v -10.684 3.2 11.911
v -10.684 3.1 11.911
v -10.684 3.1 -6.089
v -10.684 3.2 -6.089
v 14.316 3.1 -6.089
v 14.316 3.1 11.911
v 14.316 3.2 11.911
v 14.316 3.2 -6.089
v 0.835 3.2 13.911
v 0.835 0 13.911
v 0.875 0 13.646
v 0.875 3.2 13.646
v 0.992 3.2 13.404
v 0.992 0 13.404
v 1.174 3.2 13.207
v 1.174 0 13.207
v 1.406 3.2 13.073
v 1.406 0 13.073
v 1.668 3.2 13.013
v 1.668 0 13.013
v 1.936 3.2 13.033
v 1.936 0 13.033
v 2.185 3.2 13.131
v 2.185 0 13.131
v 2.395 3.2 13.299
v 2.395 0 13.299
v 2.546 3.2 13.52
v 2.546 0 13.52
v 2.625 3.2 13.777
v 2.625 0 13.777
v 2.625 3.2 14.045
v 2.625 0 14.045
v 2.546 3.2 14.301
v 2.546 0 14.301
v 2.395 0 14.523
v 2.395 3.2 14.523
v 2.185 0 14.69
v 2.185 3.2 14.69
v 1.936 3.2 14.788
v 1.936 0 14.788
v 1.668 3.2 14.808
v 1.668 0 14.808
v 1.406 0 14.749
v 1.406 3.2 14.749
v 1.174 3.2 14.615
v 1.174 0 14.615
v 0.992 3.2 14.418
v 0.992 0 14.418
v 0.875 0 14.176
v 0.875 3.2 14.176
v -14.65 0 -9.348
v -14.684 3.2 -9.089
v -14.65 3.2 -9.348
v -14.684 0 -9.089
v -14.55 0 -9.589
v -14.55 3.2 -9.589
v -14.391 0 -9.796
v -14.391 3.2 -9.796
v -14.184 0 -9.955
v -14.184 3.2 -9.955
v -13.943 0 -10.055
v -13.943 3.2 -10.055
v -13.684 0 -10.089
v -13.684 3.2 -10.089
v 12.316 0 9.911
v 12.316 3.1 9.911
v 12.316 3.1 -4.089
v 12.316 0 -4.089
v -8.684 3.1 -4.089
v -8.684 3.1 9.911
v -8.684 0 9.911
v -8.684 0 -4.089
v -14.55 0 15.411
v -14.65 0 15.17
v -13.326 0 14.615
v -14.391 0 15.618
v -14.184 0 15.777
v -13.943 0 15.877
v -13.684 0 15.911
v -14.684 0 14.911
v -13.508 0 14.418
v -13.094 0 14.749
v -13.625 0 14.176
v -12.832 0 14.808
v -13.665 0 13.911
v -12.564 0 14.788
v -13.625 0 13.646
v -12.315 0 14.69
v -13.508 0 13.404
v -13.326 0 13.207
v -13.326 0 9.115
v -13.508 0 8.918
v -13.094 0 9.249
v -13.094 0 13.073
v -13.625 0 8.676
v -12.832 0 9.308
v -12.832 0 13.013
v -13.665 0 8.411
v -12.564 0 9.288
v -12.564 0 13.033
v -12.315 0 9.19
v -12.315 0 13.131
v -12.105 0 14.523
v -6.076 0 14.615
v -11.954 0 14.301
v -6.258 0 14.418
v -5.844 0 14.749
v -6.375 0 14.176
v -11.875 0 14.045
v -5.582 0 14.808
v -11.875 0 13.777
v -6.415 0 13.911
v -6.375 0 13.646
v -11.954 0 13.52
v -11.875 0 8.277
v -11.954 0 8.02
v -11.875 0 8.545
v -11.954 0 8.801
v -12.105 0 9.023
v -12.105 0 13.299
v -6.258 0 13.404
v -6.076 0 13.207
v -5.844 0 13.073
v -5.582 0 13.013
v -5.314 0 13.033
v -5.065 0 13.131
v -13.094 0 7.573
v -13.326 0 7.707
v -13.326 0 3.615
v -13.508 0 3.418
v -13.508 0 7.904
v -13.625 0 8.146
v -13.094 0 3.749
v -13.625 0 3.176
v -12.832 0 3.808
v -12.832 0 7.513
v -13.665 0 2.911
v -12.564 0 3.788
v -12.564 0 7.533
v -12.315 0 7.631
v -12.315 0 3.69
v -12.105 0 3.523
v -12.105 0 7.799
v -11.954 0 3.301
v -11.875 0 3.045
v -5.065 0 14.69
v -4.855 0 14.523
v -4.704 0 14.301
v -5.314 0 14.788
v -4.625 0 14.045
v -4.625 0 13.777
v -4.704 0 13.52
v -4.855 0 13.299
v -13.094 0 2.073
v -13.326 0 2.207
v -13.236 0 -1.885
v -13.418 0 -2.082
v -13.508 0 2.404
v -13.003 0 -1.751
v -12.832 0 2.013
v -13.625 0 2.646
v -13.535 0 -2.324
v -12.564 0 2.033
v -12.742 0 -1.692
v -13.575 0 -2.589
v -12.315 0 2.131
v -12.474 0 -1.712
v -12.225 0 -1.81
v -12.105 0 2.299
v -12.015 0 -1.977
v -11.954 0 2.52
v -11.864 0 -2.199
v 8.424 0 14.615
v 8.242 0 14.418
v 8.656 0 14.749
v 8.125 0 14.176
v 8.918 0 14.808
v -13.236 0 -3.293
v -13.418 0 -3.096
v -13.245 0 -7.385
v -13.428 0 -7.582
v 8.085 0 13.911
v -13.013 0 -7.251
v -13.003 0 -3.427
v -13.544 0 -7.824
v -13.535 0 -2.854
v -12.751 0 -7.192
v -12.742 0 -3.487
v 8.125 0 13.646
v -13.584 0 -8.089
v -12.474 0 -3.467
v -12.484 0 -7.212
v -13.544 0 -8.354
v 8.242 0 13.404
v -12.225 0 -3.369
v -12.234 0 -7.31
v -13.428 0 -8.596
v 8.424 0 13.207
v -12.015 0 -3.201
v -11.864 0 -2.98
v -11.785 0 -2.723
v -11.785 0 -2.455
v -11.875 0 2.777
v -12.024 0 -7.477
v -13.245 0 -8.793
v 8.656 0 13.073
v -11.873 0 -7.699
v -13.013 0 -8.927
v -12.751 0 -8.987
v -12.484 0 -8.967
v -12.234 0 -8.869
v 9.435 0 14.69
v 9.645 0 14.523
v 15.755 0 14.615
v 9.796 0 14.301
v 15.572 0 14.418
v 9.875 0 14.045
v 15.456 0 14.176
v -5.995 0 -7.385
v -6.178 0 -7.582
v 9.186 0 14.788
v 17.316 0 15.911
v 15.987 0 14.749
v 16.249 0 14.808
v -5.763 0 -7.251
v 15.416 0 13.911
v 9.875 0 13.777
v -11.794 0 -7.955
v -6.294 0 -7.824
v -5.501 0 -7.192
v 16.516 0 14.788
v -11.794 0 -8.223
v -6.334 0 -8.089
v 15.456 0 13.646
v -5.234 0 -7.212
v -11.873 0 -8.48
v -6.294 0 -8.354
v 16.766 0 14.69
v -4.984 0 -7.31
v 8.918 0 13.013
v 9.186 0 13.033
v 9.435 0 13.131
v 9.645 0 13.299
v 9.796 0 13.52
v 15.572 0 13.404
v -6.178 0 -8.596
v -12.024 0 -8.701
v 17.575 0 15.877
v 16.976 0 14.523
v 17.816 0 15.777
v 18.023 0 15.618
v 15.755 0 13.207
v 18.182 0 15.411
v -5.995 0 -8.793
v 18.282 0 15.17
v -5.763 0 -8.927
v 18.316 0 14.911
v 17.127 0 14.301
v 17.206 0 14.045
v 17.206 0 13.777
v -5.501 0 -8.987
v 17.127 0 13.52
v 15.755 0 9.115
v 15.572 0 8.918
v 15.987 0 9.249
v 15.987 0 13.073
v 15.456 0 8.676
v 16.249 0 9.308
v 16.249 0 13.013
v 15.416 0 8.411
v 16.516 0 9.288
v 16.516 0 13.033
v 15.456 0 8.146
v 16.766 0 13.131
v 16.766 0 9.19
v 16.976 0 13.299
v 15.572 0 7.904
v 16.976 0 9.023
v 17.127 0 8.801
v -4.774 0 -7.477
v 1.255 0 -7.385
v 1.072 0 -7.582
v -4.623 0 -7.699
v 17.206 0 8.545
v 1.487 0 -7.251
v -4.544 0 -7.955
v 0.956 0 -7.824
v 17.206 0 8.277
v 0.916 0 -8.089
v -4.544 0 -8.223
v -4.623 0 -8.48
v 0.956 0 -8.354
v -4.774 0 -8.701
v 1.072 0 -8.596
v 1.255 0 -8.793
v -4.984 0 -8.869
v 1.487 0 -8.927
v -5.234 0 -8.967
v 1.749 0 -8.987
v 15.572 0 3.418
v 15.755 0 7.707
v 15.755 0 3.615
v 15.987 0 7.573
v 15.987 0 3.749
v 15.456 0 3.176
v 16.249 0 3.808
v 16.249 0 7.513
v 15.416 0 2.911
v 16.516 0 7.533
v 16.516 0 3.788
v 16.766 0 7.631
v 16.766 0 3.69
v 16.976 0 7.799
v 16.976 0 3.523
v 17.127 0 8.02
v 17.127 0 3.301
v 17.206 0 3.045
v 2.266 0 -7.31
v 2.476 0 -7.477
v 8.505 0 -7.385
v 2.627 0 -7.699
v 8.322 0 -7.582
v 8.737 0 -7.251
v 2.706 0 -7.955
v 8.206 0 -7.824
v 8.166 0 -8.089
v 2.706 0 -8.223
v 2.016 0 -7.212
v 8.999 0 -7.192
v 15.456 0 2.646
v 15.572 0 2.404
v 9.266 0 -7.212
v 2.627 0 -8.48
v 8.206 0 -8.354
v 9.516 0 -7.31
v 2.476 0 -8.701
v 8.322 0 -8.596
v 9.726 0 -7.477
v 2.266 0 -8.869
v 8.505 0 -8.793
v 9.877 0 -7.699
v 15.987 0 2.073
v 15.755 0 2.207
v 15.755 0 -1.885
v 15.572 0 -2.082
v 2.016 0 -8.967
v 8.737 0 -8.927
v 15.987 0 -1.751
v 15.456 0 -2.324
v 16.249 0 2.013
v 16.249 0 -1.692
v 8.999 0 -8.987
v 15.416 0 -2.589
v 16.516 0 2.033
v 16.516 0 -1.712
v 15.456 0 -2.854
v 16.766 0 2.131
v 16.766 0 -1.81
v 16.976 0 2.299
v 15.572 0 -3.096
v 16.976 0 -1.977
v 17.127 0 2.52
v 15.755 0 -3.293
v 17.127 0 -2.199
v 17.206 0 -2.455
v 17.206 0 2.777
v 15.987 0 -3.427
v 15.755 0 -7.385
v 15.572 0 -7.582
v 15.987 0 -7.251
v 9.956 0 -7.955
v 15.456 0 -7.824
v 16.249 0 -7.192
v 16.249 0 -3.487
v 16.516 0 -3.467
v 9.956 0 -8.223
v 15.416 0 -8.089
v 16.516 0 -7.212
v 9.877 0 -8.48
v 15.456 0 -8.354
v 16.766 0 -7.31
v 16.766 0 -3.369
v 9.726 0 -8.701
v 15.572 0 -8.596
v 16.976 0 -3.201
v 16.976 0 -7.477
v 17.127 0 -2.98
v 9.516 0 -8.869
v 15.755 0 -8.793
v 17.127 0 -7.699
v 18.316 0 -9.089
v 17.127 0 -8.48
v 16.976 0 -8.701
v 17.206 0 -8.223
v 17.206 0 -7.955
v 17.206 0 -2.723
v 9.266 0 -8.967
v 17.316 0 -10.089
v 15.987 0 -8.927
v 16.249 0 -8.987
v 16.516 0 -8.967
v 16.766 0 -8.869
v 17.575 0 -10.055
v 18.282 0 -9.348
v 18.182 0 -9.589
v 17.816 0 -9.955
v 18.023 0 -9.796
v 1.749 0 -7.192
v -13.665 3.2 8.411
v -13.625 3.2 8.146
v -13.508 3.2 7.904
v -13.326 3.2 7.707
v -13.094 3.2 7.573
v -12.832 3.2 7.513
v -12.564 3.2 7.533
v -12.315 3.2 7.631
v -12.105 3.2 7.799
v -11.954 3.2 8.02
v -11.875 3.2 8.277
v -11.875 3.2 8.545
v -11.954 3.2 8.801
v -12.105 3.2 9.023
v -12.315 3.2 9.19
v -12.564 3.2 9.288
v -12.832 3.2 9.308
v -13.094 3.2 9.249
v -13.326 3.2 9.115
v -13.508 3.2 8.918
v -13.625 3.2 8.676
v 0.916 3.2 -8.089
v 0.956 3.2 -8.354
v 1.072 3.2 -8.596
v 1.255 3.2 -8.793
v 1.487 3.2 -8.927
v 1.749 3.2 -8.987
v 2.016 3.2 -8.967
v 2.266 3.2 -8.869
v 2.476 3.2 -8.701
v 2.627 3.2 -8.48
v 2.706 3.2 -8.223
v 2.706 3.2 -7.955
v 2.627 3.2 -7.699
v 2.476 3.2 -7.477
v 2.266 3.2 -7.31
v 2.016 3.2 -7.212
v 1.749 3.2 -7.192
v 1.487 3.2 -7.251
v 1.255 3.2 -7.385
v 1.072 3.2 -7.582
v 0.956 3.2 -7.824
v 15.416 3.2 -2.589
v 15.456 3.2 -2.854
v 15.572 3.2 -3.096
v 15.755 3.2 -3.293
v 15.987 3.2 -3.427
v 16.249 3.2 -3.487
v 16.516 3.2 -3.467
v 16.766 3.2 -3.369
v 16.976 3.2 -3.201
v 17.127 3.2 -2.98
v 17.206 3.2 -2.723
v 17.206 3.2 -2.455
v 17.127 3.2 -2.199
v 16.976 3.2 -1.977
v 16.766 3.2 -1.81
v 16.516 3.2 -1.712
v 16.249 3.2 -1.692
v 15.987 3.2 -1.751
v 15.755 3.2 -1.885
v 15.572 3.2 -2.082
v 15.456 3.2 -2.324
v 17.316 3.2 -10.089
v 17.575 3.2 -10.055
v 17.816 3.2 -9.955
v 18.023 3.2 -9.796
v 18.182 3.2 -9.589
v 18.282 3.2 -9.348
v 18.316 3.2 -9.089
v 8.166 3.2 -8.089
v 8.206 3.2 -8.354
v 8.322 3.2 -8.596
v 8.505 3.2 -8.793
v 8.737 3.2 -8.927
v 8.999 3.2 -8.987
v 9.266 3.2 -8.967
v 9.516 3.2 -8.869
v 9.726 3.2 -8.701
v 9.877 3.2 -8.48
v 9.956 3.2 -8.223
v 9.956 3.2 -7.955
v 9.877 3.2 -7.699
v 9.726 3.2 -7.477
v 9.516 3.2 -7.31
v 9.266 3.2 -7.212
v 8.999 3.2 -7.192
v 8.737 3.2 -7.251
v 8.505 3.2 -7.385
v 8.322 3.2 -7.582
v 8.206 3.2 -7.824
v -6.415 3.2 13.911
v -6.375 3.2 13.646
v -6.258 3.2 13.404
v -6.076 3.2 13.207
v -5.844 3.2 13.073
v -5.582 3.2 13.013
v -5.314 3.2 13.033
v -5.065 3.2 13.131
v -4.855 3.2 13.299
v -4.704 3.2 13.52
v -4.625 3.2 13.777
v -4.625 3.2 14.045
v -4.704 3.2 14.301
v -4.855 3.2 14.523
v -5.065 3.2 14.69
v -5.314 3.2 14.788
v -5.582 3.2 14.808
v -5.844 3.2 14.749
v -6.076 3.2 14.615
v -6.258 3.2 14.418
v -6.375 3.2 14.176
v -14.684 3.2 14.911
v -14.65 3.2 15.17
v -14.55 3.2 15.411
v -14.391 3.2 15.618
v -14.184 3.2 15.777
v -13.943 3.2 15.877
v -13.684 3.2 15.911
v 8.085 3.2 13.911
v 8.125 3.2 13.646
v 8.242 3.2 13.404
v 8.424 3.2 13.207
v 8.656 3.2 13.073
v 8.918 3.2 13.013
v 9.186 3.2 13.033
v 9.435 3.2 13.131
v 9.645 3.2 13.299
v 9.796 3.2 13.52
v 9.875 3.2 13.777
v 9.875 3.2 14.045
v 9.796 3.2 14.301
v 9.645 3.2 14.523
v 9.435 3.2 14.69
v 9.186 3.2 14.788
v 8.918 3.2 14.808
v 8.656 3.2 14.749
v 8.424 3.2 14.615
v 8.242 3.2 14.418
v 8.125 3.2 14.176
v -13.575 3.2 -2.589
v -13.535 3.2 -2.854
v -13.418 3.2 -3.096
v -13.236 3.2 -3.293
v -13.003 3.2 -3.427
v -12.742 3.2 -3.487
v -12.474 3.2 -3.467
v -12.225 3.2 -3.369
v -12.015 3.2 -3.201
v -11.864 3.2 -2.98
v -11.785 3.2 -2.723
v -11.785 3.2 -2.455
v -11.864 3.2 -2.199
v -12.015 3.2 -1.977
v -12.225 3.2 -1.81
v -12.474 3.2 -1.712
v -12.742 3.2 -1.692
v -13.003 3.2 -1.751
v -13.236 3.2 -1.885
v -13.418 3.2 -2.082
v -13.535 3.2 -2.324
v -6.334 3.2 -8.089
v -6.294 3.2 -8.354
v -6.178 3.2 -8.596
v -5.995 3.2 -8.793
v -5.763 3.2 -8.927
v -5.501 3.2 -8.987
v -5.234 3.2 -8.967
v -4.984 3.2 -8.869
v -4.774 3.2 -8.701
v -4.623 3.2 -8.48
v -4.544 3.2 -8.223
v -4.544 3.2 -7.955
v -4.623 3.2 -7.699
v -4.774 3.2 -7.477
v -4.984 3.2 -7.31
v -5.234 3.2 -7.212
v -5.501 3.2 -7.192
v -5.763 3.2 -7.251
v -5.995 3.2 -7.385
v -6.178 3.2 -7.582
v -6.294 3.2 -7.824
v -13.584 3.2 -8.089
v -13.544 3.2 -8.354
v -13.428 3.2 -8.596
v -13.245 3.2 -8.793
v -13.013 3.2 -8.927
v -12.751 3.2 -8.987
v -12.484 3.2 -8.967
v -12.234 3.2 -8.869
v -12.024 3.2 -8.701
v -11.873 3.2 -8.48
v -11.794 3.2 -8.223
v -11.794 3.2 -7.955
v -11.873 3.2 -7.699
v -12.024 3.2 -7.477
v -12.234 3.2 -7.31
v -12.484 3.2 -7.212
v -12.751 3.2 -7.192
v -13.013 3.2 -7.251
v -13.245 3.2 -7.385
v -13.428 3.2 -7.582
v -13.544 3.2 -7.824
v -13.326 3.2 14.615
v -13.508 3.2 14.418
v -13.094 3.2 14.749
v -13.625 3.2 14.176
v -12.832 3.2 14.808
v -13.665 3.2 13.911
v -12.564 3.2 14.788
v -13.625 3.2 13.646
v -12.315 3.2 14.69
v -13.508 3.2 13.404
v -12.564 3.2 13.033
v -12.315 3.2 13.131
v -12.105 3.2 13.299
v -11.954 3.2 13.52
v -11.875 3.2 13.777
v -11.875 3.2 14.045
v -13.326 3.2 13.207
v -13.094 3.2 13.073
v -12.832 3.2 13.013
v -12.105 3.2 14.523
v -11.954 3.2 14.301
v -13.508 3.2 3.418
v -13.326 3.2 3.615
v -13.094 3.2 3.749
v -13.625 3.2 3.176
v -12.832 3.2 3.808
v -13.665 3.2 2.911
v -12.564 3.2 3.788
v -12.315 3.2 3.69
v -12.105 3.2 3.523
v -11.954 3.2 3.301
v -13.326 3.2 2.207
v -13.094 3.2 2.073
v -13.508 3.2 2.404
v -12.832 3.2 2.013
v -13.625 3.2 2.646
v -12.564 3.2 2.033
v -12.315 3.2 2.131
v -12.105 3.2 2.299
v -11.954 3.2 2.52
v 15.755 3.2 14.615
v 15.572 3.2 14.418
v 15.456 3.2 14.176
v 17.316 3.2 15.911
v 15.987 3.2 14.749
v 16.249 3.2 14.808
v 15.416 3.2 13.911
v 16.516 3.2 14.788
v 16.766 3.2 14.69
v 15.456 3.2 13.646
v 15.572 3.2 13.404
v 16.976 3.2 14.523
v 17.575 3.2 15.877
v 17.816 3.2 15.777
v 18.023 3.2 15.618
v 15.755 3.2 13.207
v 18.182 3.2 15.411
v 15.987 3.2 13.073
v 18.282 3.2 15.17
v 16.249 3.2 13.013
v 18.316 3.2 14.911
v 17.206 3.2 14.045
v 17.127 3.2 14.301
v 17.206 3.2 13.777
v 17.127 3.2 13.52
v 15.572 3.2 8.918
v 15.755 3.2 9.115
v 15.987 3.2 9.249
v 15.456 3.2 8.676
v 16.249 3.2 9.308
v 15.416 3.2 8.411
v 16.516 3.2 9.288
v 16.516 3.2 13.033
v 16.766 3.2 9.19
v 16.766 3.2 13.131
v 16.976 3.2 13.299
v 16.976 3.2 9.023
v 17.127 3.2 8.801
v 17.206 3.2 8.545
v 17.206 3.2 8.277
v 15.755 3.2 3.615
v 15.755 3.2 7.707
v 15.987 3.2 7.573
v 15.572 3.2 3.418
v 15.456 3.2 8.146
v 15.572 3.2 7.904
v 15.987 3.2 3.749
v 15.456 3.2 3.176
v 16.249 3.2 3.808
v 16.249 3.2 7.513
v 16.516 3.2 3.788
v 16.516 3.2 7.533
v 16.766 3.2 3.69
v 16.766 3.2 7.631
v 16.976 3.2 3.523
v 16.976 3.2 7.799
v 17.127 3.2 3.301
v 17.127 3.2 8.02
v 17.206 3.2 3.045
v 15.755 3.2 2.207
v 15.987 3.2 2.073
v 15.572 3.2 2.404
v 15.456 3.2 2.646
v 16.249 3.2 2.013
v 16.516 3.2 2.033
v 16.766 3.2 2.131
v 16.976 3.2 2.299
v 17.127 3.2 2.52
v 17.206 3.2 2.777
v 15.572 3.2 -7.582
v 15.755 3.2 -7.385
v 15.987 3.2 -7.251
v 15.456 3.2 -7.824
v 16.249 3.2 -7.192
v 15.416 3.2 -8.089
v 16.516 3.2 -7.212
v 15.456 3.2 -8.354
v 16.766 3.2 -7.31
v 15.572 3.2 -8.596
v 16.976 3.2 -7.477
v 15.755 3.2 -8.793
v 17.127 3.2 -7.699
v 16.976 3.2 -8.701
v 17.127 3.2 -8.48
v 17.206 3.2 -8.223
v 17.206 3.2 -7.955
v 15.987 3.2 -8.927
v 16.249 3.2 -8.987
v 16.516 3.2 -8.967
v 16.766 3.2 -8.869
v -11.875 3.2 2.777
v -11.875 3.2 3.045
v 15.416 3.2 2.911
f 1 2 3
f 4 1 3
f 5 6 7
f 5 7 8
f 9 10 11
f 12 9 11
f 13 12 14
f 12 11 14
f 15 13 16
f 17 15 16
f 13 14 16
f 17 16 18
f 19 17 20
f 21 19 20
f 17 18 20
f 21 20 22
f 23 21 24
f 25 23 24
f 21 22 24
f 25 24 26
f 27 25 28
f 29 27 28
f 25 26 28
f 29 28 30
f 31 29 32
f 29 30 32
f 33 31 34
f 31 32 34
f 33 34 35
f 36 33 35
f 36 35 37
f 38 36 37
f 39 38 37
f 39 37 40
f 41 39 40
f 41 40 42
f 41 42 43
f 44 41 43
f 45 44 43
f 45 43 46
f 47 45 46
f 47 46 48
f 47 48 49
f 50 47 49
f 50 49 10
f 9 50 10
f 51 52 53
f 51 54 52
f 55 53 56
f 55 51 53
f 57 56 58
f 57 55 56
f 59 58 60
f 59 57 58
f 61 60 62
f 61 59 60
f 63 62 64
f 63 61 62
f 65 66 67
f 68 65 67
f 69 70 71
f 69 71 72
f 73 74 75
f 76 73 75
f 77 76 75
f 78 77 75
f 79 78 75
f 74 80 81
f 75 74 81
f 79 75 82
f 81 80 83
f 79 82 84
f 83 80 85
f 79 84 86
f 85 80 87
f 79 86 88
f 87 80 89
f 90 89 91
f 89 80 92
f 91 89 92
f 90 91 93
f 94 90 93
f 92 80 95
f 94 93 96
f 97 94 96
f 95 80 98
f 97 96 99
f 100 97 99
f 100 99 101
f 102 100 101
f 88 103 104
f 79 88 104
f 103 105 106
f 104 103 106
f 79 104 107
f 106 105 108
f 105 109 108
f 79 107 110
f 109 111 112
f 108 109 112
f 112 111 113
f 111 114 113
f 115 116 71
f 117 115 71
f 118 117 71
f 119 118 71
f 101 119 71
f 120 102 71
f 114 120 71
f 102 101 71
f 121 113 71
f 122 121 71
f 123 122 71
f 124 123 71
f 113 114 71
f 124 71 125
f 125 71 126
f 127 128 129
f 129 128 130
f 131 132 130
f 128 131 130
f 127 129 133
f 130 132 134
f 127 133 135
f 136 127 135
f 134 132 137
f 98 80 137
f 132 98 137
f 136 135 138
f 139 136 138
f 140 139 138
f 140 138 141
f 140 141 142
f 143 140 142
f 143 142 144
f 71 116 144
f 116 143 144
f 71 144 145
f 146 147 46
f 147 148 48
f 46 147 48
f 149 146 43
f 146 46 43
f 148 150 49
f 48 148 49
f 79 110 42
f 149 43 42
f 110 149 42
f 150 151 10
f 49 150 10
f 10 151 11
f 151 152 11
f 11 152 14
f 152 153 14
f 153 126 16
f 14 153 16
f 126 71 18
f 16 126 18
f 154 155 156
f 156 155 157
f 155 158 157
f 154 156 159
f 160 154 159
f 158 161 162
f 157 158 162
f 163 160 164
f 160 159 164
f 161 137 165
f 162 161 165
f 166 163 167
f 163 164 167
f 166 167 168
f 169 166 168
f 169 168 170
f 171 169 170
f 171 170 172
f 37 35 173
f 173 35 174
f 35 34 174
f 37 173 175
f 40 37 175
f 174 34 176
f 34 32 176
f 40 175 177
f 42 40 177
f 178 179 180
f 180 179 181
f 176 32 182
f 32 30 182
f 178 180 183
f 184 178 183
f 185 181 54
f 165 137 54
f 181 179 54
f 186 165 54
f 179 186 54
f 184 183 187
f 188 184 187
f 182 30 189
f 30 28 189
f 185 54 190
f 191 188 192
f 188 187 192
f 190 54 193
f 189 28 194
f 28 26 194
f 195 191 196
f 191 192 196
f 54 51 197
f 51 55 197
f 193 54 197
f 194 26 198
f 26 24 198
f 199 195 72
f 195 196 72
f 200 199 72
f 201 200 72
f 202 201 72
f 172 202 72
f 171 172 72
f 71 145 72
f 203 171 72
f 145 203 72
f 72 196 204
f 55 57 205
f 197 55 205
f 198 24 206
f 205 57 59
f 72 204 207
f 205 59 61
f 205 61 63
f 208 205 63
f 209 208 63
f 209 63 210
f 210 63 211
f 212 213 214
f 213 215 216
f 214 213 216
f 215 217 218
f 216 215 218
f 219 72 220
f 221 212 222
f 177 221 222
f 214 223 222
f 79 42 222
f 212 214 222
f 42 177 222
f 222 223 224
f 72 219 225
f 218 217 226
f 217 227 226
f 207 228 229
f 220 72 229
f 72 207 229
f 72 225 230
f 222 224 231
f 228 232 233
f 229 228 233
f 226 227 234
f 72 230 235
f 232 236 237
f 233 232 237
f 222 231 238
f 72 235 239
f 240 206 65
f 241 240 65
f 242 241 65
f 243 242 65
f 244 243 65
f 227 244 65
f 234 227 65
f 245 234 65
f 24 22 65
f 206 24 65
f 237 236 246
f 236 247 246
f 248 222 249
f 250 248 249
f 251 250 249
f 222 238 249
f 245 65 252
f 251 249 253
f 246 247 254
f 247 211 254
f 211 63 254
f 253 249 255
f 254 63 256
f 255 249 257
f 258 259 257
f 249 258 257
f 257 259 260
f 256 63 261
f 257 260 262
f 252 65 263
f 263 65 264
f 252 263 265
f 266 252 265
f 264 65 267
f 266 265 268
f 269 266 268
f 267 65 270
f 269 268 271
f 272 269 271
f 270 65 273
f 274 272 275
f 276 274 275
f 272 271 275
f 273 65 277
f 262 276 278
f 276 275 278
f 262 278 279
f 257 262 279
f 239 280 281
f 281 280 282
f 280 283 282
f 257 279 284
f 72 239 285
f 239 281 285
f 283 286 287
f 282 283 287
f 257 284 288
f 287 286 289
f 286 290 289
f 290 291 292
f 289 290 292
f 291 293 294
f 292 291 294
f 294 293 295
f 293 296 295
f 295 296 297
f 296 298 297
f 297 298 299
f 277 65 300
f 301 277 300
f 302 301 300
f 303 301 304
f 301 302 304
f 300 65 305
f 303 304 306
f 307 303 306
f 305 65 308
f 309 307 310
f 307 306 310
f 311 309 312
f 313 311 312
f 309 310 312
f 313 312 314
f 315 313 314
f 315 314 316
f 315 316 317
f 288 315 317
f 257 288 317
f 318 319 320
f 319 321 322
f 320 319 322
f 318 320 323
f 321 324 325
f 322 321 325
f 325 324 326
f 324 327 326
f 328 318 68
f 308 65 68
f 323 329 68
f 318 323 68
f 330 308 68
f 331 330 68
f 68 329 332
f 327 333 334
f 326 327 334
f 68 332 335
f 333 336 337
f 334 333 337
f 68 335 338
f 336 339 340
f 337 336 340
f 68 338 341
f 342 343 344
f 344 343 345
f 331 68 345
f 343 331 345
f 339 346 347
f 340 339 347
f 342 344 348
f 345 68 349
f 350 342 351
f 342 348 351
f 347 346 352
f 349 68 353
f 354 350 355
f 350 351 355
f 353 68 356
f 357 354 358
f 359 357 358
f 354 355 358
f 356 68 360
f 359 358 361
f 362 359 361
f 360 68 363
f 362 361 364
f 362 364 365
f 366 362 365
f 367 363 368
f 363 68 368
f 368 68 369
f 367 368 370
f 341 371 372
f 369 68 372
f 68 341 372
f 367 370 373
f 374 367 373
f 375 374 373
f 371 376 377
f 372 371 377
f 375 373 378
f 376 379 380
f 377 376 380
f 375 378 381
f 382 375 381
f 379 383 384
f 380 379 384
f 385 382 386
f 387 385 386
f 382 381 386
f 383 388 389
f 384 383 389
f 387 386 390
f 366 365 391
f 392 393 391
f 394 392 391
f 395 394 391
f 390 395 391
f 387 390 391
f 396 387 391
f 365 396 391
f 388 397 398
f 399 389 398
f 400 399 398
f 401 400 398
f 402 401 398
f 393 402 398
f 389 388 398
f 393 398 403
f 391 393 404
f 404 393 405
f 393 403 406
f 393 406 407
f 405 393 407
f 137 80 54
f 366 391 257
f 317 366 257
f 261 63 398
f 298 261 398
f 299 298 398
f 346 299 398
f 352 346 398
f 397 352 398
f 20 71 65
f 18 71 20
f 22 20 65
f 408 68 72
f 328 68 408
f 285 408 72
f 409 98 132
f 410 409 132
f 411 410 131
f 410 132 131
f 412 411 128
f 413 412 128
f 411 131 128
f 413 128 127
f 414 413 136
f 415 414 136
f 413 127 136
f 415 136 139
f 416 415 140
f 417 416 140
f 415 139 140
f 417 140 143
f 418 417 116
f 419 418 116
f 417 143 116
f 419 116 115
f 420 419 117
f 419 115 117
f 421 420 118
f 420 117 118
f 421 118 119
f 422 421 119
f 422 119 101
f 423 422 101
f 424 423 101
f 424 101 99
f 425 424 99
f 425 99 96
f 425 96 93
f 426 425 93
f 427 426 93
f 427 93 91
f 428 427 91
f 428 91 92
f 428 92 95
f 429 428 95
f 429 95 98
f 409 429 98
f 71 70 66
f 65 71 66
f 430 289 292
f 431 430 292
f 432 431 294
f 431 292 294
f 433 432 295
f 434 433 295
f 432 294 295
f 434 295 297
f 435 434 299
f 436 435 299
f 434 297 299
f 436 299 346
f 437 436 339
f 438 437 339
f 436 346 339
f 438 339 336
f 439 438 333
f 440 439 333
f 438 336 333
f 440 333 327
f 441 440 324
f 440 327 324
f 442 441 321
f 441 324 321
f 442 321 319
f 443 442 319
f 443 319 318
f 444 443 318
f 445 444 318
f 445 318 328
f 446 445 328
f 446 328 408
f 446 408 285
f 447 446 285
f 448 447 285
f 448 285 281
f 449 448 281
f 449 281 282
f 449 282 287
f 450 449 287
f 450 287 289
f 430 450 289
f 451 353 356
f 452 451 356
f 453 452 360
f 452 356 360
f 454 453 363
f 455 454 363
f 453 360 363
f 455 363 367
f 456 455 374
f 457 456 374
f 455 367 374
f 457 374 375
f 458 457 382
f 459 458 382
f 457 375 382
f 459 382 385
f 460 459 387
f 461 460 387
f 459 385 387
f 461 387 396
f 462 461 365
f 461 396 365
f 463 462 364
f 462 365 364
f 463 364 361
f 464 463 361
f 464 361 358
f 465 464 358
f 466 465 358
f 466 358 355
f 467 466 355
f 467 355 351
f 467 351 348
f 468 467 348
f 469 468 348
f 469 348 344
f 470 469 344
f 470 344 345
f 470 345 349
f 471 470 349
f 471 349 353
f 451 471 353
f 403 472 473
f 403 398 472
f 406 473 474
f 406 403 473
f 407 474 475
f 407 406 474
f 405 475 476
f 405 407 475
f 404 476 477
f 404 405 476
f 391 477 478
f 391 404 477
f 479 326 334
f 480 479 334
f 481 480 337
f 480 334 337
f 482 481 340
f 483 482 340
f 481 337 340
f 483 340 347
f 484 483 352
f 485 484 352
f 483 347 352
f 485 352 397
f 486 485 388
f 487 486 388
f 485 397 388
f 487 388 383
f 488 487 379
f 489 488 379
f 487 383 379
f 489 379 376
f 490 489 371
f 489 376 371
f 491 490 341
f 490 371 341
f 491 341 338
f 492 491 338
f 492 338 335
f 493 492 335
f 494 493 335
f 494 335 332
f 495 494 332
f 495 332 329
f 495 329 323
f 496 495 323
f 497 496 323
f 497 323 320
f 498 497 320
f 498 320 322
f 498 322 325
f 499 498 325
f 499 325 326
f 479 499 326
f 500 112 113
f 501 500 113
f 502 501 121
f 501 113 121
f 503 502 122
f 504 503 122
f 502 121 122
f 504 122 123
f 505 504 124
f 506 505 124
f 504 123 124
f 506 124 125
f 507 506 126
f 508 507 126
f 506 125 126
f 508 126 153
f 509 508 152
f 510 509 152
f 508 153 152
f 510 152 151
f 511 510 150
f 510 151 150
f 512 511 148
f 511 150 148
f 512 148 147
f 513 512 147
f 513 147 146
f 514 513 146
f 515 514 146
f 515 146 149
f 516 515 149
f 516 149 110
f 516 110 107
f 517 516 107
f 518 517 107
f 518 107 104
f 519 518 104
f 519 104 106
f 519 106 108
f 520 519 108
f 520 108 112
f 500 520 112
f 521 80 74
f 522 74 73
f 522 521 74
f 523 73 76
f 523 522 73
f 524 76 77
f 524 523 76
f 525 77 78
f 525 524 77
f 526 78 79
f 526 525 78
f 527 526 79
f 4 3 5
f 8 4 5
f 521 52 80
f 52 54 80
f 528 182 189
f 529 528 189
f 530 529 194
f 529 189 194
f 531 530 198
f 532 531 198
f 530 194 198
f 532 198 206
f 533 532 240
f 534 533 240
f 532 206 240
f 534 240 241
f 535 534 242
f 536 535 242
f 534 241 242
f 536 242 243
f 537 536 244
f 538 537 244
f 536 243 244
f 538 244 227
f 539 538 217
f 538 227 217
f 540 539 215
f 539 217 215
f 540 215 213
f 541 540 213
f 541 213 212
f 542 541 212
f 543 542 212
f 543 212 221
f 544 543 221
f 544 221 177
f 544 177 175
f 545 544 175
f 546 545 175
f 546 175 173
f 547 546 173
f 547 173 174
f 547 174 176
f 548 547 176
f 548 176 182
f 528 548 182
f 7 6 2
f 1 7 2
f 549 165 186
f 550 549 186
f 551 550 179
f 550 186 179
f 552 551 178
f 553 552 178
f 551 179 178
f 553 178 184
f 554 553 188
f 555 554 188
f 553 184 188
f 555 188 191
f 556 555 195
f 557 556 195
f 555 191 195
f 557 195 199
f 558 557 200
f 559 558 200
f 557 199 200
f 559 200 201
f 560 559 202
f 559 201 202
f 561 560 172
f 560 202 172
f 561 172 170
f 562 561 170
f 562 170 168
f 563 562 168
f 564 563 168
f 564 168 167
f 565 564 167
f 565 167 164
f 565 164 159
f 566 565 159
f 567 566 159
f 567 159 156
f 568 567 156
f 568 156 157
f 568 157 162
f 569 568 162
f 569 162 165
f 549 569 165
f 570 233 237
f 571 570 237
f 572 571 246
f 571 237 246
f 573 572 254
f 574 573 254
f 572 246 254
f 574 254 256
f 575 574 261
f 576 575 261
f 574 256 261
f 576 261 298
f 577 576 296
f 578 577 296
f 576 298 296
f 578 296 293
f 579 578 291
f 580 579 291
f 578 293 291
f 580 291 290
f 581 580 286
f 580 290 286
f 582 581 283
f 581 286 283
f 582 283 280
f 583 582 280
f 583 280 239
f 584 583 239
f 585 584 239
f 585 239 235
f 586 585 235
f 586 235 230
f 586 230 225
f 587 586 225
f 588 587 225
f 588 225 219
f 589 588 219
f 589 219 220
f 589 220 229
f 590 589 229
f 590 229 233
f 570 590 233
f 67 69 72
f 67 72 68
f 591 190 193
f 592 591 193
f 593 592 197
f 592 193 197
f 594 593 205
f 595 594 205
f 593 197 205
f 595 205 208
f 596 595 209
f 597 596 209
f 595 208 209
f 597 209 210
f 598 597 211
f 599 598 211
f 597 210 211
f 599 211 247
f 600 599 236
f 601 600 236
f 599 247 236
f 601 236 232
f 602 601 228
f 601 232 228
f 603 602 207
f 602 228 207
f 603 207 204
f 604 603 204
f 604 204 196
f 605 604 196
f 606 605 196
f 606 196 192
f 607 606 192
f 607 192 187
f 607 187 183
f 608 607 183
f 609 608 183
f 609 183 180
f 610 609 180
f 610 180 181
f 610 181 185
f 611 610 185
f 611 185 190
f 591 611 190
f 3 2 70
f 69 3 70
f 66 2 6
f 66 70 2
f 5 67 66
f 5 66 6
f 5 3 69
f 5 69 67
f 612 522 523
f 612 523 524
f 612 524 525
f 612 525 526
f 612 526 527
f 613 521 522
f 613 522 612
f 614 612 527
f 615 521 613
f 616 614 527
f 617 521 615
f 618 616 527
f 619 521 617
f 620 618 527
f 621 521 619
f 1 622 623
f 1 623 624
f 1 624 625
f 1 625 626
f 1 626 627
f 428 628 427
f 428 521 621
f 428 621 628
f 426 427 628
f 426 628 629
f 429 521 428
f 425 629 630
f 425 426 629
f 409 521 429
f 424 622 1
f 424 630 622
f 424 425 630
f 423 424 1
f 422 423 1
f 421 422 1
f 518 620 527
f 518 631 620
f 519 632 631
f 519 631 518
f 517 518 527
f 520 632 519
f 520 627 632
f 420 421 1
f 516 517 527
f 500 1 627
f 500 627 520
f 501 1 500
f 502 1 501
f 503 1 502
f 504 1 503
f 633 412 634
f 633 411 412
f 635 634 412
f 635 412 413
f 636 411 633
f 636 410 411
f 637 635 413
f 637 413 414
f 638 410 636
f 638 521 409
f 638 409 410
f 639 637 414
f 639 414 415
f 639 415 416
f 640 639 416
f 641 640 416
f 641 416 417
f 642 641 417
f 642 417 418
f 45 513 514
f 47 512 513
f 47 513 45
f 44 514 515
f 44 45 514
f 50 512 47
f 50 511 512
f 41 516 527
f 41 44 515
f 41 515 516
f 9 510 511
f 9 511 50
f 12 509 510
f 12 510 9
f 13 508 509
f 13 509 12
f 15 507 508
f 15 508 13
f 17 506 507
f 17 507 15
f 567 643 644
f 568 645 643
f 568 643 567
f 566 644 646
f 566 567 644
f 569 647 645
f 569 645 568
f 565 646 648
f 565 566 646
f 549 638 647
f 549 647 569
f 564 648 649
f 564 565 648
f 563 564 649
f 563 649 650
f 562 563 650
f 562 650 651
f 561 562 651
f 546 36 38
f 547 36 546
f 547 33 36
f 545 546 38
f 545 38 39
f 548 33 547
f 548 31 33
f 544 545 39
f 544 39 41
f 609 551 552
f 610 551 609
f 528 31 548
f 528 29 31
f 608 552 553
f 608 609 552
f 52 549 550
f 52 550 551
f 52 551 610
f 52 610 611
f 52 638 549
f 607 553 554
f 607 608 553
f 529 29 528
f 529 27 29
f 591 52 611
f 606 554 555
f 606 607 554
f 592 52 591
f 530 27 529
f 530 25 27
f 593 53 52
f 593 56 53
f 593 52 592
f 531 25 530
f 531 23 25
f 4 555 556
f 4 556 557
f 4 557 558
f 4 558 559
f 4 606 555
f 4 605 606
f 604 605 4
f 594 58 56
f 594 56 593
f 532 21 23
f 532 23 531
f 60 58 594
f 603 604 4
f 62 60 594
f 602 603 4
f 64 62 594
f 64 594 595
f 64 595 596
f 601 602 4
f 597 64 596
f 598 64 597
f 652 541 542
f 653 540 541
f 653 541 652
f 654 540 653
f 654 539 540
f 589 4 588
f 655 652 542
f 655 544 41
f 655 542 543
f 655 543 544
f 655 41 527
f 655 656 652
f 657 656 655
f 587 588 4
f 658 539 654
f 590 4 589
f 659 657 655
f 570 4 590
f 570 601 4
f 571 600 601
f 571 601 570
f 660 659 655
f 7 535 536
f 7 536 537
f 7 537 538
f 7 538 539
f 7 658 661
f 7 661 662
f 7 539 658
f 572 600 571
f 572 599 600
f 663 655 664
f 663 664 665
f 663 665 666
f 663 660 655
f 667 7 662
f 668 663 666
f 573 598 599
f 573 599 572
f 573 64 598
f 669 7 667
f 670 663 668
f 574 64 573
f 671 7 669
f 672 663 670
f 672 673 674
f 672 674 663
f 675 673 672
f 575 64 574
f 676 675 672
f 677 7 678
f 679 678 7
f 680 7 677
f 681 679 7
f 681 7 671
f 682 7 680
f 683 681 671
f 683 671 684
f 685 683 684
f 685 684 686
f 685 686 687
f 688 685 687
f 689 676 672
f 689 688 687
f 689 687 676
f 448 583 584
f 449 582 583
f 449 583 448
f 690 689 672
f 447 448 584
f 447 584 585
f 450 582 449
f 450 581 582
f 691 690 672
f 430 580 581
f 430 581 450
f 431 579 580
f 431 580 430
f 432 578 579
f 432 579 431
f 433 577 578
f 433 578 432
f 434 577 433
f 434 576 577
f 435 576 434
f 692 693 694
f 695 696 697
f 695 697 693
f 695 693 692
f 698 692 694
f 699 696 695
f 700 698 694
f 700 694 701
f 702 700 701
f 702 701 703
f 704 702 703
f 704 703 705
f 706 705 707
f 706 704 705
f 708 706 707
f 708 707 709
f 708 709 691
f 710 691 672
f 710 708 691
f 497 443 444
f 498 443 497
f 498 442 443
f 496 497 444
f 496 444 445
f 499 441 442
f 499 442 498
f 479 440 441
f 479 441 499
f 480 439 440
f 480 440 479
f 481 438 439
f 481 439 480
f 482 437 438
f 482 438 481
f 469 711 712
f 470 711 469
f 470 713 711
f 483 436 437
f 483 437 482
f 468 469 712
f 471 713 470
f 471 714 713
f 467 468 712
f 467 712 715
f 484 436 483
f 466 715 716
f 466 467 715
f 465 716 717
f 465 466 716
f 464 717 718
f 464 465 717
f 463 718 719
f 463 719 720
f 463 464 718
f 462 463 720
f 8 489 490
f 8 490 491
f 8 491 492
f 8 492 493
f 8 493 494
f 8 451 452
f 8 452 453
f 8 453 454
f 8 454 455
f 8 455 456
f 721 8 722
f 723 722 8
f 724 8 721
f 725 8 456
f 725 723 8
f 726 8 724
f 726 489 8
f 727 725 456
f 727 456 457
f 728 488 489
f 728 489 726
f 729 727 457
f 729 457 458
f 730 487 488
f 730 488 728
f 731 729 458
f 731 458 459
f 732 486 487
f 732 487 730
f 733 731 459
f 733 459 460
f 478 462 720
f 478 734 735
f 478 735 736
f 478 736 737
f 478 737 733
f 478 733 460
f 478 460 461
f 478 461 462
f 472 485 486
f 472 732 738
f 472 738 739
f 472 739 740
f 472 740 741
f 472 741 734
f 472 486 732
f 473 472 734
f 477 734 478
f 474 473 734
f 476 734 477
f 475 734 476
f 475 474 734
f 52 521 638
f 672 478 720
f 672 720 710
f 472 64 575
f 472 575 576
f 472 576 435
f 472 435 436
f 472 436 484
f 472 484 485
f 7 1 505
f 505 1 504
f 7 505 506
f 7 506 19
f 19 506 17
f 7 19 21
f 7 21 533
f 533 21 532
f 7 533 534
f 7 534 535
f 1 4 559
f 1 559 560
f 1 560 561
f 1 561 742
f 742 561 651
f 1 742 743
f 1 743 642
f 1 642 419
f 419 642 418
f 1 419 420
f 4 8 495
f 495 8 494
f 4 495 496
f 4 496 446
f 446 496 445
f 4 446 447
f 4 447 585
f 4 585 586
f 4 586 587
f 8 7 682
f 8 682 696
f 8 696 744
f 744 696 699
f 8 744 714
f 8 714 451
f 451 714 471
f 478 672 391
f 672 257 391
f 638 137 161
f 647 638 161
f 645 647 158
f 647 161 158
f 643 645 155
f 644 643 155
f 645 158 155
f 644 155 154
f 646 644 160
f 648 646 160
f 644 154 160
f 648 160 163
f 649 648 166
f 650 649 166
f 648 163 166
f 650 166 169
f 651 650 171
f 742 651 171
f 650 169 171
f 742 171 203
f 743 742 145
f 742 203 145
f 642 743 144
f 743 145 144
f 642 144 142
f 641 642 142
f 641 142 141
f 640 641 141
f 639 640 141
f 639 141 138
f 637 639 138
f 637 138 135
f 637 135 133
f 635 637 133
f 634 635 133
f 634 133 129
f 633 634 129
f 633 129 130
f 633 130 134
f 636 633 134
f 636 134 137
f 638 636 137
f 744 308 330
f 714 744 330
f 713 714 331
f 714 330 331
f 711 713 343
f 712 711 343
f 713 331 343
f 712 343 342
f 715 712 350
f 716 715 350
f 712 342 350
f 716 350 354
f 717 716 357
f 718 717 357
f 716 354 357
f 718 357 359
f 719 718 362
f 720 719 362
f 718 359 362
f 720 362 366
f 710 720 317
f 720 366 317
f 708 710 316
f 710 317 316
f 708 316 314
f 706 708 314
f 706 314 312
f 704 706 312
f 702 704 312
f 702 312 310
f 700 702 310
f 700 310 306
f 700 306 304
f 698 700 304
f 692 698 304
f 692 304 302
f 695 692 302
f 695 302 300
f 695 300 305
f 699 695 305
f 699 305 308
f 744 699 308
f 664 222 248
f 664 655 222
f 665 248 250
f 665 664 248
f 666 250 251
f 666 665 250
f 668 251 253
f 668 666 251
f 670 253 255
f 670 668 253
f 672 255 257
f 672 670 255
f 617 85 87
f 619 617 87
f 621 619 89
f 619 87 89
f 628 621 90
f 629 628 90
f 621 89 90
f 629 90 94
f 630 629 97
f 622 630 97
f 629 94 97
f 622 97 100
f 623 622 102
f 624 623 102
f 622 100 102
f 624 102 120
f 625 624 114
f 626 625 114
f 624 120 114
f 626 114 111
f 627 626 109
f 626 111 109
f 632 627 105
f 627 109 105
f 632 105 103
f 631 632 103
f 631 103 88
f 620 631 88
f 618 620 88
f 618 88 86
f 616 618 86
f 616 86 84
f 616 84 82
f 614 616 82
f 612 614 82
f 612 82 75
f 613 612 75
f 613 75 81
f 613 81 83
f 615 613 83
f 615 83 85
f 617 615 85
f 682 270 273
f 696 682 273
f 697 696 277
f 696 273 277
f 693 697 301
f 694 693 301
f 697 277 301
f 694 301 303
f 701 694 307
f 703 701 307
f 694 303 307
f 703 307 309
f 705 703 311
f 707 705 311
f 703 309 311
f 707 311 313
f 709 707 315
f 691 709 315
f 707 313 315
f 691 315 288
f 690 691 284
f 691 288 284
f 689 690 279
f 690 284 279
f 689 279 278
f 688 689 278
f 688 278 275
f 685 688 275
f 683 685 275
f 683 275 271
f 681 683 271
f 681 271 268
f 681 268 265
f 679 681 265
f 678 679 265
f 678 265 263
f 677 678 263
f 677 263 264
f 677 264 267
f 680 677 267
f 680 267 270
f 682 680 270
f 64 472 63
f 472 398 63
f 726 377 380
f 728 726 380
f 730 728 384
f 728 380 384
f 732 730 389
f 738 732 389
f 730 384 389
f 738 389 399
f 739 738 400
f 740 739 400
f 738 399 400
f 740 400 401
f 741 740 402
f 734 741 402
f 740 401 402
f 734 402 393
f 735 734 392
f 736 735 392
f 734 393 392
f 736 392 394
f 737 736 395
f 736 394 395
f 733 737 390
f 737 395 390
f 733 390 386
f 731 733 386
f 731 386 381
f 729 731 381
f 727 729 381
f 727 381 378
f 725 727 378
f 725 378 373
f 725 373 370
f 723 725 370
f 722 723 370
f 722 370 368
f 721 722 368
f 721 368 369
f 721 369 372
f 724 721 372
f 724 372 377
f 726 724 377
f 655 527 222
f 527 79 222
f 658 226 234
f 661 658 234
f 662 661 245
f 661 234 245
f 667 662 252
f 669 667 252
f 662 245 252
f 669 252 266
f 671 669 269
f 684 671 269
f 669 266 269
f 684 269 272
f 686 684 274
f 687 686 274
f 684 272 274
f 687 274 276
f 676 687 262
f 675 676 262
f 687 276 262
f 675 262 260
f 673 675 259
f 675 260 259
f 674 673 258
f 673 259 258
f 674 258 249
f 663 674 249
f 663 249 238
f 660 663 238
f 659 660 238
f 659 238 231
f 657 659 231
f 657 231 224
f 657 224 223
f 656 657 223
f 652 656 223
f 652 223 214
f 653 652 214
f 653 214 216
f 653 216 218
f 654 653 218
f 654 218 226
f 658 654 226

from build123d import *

# Parameters (mm, degrees)
SKETCH1_W                   = 33
SKETCH1_H                   = 26
BOSS_EXTRUDE1_DEPTH         = 3.1
SKETCH3_W                   = 4
SKETCH3_H                   = 18
BOSS_EXTRUDE2_DEPTH         = 0.1
TAP_DRILL_FOR_M2X0_4_TAP2_D = 1.8
FILLET2_R                   = 1
SKETCH11_W                  = 21
SKETCH11_H                  = 14
CUT_EXTRUDE2_DEPTH          = 25.459005547


with BuildPart() as part:
    # Sketch1 → Boss-Extrude1 (new body)
    with BuildSketch(Plane(origin=(0, 0, 0), x_dir=(1, 0, 0), z_dir=(0, 1, 0))):
        with Locations((1.816045381, -2.910858995)):
            Rectangle(SKETCH1_W, SKETCH1_H)
    extrude(amount=BOSS_EXTRUDE1_DEPTH)

    # Sketch3 → Boss-Extrude2 (add)
    with BuildSketch(Plane(origin=(0, 3.1, 0), x_dir=(1, 0, 0), z_dir=(0, 1, 0))):
        Polygon((-10.683954619, 10.089141005), (-14.683954619, 10.089141005), (-14.683954619, -15.910858995), (-10.683954619, -15.910858995), (-10.683954619, -11.910858995), (-10.683954619, 6.089141005), align=None)
        Polygon((18.316045381, 10.089141005), (-10.683954619, 10.089141005), (-10.683954619, 6.089141005), (14.316045381, 6.089141005), (18.316045381, 6.089141005), align=None)
        Polygon((-10.683954619, -11.910858995), (-10.683954619, -15.910858995), (18.316045381, -15.910858995), (18.316045381, -11.910858995), (14.316045381, -11.910858995), align=None)
        with Locations((16.316045381, -2.910858995)):
            Rectangle(SKETCH3_W, SKETCH3_H)
    extrude(amount=BOSS_EXTRUDE2_DEPTH)

    # Tap Drill for M2x0.4 Tap2 (through all)
    with Locations(Plane(origin=(0, 3.2, 0), x_dir=(1, 0, 0), z_dir=(0, 1, 0))):
        with Locations((-12.683954619, 8.089141005), (-12.674525688, 2.589141005), (-12.764705981, -2.910858995), (-12.764705981, -8.410858995), (-12.764705981, -13.910858995), (-5.433954619, 8.089141005), (1.816045381, 8.089141005), (1.735294019, -13.910858995), (-5.514705981, -13.910858995), (9.066045381, 8.089141005), (16.316045381, 8.089141005), (16.316045381, 2.589141005), (16.316045381, -2.910858995), (16.316045381, -8.410858995), (16.316045381, -13.910858995), (8.985294019, -13.910858995)):
            Hole(TAP_DRILL_FOR_M2X0_4_TAP2_D / 2)

    # Fillet2
    fillet2_edges = [part.edges().sort_by_distance(p)[0] for p in [
        (-14.683954619, 1.6, -10.089141005),
        (18.316045381, 1.6, -10.089141005),
        (18.316045381, 1.6, 15.910858995),
        (-14.683954619, 1.6, 15.910858995),
    ]]
    fillet(fillet2_edges, radius=FILLET2_R)

    # Sketch11 → Cut-Extrude2 (cut, through all)
    with BuildSketch(Plane(origin=(0, 3.1, 0), x_dir=(1, 0, 0), z_dir=(0, 1, 0))):
        with Locations((1.816045381, -2.910858995)):
            Rectangle(SKETCH11_W, SKETCH11_H)
    extrude(amount=-CUT_EXTRUDE2_DEPTH, mode=Mode.SUBTRACT)


solid = part.part
